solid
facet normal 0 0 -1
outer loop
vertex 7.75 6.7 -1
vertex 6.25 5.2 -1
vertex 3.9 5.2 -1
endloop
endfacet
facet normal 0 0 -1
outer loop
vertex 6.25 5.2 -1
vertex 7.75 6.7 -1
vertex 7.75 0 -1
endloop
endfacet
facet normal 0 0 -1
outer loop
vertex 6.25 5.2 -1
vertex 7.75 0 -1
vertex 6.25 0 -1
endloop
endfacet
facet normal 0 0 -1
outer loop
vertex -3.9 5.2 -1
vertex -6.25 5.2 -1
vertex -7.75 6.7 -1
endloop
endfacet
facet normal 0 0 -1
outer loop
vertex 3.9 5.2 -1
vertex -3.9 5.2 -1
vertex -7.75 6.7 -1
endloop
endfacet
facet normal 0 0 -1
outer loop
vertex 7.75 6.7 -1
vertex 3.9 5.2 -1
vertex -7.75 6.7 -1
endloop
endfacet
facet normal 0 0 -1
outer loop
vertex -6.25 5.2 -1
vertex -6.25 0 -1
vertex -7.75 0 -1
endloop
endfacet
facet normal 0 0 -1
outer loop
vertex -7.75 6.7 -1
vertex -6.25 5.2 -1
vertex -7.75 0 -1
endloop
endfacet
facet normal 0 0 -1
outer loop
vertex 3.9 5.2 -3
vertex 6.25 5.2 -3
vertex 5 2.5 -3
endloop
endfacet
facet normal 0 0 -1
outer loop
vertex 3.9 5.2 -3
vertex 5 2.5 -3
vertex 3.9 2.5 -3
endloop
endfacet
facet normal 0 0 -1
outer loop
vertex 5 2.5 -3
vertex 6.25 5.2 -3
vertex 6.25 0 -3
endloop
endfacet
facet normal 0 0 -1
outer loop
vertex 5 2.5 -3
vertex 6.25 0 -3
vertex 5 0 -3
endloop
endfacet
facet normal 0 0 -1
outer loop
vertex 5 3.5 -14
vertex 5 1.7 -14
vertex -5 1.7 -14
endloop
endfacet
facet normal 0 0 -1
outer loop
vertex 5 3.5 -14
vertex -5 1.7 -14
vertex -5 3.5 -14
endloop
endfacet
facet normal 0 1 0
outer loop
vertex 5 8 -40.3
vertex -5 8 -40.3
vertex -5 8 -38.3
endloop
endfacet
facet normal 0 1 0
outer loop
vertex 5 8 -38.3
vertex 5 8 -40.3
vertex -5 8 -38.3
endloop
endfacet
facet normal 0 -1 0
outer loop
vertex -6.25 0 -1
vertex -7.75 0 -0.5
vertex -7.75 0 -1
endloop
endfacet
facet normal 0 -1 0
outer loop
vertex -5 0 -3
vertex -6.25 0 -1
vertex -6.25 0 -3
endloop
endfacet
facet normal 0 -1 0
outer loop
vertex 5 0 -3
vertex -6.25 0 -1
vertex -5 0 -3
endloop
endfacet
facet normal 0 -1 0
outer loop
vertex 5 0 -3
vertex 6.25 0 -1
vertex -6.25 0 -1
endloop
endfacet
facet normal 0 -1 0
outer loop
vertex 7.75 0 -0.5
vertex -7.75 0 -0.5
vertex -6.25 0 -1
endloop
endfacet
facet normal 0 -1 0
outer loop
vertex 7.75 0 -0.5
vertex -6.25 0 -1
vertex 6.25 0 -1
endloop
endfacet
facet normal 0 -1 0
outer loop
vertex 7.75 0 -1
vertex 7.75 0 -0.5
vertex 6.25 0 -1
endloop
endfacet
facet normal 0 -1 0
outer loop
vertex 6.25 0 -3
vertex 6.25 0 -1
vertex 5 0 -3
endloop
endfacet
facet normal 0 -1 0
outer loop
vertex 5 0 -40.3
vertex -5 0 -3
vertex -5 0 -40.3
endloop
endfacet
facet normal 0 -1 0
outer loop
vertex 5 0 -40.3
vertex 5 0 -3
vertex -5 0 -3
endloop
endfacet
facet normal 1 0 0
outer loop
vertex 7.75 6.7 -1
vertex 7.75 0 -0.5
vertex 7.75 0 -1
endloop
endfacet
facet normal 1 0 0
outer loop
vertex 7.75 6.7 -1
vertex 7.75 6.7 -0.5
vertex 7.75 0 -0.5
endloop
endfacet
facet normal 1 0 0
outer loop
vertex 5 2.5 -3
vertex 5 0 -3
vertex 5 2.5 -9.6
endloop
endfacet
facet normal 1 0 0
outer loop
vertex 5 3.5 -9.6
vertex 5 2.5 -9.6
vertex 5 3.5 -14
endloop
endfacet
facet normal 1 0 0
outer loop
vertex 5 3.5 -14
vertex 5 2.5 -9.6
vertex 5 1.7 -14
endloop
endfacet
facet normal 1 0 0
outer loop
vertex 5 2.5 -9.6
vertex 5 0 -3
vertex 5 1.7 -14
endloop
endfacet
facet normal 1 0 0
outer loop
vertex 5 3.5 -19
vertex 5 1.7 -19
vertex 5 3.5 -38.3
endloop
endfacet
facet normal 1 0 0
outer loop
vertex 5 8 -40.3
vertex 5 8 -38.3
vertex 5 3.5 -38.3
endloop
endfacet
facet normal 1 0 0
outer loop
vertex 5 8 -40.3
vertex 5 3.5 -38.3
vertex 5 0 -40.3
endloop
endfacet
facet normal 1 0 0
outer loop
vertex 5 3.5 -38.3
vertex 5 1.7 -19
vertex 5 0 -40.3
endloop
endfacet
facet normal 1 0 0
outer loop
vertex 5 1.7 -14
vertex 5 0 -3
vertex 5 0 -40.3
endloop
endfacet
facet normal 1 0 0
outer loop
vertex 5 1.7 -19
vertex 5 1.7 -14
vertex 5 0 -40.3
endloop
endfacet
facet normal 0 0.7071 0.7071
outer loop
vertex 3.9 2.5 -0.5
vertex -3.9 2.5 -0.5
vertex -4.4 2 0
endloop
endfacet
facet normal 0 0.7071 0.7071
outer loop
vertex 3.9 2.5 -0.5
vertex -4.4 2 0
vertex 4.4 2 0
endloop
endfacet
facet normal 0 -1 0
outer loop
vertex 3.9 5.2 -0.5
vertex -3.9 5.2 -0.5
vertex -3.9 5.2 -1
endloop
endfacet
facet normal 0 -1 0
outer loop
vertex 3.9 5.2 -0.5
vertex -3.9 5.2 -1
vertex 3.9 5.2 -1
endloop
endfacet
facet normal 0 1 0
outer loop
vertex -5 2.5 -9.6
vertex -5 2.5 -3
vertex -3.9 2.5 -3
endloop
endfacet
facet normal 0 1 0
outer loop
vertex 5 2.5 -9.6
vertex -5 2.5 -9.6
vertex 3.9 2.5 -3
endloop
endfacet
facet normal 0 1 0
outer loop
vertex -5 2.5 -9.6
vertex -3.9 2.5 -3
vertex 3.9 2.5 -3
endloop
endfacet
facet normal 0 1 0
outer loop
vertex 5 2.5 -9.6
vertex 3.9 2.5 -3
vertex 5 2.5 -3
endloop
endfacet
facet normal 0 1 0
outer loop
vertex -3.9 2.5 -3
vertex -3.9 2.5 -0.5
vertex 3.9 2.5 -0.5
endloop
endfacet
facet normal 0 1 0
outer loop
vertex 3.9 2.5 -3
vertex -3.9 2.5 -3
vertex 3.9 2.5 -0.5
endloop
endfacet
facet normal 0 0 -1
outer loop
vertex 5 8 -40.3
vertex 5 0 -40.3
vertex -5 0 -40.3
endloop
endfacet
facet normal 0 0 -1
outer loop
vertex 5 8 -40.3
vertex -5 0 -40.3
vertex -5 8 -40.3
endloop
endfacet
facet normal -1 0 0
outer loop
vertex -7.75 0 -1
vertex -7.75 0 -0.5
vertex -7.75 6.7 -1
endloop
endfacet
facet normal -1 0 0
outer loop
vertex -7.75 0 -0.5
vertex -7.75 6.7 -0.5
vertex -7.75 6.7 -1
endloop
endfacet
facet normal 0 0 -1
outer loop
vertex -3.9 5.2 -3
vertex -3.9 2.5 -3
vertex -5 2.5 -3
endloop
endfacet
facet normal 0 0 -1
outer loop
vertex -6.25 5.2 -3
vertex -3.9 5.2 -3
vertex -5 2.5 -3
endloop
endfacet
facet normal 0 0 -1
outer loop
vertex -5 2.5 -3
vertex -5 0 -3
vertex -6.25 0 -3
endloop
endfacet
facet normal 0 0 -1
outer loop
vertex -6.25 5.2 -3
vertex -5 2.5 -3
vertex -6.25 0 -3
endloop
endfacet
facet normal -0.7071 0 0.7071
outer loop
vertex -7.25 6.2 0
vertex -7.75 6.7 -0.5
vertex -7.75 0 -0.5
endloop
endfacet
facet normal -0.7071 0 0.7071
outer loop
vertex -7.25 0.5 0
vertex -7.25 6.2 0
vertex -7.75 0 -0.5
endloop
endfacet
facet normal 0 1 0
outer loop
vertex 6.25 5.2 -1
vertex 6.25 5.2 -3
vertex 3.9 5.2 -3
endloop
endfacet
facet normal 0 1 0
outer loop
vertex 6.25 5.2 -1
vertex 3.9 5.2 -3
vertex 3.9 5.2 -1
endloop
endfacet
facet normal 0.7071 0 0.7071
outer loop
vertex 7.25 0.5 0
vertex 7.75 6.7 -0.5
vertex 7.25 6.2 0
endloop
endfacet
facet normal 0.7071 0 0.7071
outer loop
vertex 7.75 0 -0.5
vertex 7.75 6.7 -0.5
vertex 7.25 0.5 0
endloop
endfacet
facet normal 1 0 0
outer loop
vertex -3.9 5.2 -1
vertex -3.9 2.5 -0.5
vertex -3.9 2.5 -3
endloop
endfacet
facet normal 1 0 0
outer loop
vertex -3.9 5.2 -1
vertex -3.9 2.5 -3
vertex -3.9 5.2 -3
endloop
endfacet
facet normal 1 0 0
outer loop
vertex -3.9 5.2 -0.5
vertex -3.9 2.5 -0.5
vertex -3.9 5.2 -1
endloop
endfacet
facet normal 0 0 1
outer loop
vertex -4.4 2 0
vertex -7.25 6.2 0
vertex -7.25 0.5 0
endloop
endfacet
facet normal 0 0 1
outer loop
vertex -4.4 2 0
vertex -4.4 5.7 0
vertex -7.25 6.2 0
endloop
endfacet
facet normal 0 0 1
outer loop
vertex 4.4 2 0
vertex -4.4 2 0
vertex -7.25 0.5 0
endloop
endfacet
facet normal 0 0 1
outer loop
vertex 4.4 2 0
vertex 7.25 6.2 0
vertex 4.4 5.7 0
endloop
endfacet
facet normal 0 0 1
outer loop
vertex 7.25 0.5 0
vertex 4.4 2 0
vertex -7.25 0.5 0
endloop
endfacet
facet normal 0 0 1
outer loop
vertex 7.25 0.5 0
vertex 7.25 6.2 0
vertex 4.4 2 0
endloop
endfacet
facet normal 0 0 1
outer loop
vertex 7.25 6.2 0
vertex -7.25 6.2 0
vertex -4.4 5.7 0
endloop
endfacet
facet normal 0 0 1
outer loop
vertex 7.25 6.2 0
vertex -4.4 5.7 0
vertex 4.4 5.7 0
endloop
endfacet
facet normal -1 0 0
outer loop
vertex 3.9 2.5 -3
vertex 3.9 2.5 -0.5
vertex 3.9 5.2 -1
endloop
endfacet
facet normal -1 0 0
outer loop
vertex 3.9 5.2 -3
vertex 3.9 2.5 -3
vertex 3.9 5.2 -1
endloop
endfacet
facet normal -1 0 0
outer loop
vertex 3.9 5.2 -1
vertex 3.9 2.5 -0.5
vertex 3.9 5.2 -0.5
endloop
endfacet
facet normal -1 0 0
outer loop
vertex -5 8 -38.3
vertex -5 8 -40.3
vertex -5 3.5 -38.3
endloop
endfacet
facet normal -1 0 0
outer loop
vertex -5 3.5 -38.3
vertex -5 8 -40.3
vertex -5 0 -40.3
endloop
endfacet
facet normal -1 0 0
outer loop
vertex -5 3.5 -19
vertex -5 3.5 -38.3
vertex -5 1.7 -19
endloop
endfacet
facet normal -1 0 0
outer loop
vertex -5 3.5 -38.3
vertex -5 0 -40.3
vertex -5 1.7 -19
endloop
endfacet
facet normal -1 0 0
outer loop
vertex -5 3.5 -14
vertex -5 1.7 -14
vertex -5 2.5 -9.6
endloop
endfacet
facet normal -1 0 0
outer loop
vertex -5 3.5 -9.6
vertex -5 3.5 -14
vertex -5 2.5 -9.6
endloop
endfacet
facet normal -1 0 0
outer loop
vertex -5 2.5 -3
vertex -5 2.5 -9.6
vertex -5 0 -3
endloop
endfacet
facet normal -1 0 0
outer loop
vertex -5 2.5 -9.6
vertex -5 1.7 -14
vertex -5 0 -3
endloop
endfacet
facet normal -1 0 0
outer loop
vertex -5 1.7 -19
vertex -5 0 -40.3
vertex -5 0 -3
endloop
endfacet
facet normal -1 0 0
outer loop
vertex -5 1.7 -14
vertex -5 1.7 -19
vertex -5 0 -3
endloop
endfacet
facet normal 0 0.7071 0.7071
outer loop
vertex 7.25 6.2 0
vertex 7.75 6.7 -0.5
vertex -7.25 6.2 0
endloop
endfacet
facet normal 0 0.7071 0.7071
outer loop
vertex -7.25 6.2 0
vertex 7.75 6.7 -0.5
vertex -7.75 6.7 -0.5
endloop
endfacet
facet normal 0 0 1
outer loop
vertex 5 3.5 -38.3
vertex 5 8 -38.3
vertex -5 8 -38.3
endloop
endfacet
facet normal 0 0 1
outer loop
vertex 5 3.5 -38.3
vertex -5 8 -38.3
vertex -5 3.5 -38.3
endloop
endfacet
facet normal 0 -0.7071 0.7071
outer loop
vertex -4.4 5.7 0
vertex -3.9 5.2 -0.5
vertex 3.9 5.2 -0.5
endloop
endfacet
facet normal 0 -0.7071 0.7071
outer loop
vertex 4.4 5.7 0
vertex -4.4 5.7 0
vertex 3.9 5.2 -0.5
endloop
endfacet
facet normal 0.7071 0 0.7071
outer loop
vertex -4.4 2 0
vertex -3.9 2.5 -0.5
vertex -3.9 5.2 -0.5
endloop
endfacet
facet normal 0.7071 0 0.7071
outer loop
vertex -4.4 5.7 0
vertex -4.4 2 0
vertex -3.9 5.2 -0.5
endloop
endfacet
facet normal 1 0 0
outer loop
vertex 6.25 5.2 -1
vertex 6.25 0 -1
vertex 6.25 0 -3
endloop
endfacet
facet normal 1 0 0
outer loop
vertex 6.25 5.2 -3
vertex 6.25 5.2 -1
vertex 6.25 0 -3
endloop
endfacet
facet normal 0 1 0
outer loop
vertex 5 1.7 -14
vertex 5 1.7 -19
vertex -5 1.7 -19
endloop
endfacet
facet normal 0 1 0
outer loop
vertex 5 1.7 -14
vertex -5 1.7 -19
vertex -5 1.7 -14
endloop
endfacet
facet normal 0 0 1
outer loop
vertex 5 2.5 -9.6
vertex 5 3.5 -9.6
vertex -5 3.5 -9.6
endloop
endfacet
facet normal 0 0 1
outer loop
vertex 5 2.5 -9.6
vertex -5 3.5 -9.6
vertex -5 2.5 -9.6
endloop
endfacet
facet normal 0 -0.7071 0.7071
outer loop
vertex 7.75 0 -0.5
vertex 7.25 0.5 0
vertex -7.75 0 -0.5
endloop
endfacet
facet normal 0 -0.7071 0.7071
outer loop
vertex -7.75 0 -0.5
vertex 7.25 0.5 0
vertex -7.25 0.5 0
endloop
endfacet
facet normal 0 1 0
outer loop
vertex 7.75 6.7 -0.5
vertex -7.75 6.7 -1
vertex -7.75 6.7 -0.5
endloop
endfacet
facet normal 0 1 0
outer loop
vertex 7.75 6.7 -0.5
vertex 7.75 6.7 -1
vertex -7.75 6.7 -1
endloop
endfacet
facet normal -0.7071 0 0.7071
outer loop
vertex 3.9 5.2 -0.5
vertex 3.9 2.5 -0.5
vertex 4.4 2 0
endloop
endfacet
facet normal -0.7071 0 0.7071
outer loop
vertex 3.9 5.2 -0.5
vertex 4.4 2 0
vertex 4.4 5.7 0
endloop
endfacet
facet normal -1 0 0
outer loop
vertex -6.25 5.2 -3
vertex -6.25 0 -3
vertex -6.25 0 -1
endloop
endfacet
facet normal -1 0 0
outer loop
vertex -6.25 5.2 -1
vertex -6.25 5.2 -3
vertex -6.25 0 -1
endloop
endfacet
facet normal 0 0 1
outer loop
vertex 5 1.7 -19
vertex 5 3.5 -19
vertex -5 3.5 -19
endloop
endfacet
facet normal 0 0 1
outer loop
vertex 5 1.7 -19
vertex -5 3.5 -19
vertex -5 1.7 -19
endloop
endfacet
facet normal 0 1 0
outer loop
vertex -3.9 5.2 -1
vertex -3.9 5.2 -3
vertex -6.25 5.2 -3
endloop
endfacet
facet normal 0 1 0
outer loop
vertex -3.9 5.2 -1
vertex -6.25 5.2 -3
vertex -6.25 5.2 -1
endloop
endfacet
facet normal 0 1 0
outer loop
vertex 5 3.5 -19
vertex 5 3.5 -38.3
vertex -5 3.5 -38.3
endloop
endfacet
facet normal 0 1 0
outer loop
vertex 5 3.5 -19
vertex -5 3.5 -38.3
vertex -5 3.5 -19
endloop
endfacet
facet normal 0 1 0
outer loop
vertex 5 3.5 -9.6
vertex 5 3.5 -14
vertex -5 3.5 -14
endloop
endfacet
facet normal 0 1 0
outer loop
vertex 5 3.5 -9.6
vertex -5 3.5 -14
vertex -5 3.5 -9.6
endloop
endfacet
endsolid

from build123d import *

# Parameters (mm, degrees)
BOSS_EXTRUDE1_DEPTH     = 7.75
CUT_EXTRUDE_THIN1_DEPTH = 42.810913647
CUT_EXTRUDE1_REACH      = 43.811
SKETCH3_W               = 7.8
SKETCH3_H               = 2.7
CHAMFER1_SIZE           = 0.5


with BuildPart() as part:
    # Sketch1 → Boss-Extrude1 (new, symmetric)
    with BuildSketch(Plane(origin=(0, 0, 0), x_dir=(0, 0, -1), z_dir=(1, 0, 0))):
        Polygon((0, 0), (40.3, 0), (40.3, 8), (38.3, 8), (38.3, 3.5), (19, 3.5), (19, 1.7), (14, 1.7), (14, 3.5), (9.6, 3.5), (9.6, 2.5), (3, 2.5), (3, 5.2), (1, 5.2), (1, 6.7), (0, 6.7), align=None)
    extrude(amount=BOSS_EXTRUDE1_DEPTH, both=True)

    # Sketch2 → Cut-Extrude-Thin1 (cut, through all)
    with BuildSketch(Plane(origin=(0, 0, 0), x_dir=(1, 0, 0), z_dir=(0, 1, 0))):
        Polygon((-17.75, -10), (17.75, -10), (17.75, 11), (16.25, 11), (16.25, 13), (15, 13), (15, 50.3), (-15, 50.3), (-15, 13), (-16.25, 13), (-16.25, 11), (-17.75, 11), align=None)
        Polygon((-7.75, 0), (7.75, 0), (7.75, 1), (6.25, 1), (6.25, 3), (5, 3), (5, 40.3), (-5, 40.3), (-5, 3), (-6.25, 3), (-6.25, 1), (-7.75, 1), align=None, mode=Mode.SUBTRACT)
    extrude(amount=CUT_EXTRUDE_THIN1_DEPTH, mode=Mode.SUBTRACT)

    # Sketch3 → Cut-Extrude1 (cut, up to next)
    with BuildSketch(Plane.XY, mode=Mode.PRIVATE) as cut_extrude1_sk1:
        with Locations((0, 3.85)):
            Rectangle(SKETCH3_W, SKETCH3_H)
    cut_extrude1_tool1 = extrude(cut_extrude1_sk1.sketch, amount=-CUT_EXTRUDE1_REACH, mode=Mode.PRIVATE) & part.part
    add(cut_extrude1_tool1.solids().sort_by_distance((0, 3.85, 0))[0], mode=Mode.SUBTRACT)

    # Chamfer1
    chamfer1_edges = [part.edges().sort_by_distance(p)[0] for p in [
        (-3.9, 3.85, 0),
        (0, 2.5, 0),
        (3.9, 3.85, 0),
        (0, 5.2, 0),
        (-7.75, 3.35, 0),
        (0, 6.7, 0),
        (0, 0, 0),
        (7.75, 3.35, 0),
    ]]
    chamfer(chamfer1_edges, length=CHAMFER1_SIZE)


solid = part.part
